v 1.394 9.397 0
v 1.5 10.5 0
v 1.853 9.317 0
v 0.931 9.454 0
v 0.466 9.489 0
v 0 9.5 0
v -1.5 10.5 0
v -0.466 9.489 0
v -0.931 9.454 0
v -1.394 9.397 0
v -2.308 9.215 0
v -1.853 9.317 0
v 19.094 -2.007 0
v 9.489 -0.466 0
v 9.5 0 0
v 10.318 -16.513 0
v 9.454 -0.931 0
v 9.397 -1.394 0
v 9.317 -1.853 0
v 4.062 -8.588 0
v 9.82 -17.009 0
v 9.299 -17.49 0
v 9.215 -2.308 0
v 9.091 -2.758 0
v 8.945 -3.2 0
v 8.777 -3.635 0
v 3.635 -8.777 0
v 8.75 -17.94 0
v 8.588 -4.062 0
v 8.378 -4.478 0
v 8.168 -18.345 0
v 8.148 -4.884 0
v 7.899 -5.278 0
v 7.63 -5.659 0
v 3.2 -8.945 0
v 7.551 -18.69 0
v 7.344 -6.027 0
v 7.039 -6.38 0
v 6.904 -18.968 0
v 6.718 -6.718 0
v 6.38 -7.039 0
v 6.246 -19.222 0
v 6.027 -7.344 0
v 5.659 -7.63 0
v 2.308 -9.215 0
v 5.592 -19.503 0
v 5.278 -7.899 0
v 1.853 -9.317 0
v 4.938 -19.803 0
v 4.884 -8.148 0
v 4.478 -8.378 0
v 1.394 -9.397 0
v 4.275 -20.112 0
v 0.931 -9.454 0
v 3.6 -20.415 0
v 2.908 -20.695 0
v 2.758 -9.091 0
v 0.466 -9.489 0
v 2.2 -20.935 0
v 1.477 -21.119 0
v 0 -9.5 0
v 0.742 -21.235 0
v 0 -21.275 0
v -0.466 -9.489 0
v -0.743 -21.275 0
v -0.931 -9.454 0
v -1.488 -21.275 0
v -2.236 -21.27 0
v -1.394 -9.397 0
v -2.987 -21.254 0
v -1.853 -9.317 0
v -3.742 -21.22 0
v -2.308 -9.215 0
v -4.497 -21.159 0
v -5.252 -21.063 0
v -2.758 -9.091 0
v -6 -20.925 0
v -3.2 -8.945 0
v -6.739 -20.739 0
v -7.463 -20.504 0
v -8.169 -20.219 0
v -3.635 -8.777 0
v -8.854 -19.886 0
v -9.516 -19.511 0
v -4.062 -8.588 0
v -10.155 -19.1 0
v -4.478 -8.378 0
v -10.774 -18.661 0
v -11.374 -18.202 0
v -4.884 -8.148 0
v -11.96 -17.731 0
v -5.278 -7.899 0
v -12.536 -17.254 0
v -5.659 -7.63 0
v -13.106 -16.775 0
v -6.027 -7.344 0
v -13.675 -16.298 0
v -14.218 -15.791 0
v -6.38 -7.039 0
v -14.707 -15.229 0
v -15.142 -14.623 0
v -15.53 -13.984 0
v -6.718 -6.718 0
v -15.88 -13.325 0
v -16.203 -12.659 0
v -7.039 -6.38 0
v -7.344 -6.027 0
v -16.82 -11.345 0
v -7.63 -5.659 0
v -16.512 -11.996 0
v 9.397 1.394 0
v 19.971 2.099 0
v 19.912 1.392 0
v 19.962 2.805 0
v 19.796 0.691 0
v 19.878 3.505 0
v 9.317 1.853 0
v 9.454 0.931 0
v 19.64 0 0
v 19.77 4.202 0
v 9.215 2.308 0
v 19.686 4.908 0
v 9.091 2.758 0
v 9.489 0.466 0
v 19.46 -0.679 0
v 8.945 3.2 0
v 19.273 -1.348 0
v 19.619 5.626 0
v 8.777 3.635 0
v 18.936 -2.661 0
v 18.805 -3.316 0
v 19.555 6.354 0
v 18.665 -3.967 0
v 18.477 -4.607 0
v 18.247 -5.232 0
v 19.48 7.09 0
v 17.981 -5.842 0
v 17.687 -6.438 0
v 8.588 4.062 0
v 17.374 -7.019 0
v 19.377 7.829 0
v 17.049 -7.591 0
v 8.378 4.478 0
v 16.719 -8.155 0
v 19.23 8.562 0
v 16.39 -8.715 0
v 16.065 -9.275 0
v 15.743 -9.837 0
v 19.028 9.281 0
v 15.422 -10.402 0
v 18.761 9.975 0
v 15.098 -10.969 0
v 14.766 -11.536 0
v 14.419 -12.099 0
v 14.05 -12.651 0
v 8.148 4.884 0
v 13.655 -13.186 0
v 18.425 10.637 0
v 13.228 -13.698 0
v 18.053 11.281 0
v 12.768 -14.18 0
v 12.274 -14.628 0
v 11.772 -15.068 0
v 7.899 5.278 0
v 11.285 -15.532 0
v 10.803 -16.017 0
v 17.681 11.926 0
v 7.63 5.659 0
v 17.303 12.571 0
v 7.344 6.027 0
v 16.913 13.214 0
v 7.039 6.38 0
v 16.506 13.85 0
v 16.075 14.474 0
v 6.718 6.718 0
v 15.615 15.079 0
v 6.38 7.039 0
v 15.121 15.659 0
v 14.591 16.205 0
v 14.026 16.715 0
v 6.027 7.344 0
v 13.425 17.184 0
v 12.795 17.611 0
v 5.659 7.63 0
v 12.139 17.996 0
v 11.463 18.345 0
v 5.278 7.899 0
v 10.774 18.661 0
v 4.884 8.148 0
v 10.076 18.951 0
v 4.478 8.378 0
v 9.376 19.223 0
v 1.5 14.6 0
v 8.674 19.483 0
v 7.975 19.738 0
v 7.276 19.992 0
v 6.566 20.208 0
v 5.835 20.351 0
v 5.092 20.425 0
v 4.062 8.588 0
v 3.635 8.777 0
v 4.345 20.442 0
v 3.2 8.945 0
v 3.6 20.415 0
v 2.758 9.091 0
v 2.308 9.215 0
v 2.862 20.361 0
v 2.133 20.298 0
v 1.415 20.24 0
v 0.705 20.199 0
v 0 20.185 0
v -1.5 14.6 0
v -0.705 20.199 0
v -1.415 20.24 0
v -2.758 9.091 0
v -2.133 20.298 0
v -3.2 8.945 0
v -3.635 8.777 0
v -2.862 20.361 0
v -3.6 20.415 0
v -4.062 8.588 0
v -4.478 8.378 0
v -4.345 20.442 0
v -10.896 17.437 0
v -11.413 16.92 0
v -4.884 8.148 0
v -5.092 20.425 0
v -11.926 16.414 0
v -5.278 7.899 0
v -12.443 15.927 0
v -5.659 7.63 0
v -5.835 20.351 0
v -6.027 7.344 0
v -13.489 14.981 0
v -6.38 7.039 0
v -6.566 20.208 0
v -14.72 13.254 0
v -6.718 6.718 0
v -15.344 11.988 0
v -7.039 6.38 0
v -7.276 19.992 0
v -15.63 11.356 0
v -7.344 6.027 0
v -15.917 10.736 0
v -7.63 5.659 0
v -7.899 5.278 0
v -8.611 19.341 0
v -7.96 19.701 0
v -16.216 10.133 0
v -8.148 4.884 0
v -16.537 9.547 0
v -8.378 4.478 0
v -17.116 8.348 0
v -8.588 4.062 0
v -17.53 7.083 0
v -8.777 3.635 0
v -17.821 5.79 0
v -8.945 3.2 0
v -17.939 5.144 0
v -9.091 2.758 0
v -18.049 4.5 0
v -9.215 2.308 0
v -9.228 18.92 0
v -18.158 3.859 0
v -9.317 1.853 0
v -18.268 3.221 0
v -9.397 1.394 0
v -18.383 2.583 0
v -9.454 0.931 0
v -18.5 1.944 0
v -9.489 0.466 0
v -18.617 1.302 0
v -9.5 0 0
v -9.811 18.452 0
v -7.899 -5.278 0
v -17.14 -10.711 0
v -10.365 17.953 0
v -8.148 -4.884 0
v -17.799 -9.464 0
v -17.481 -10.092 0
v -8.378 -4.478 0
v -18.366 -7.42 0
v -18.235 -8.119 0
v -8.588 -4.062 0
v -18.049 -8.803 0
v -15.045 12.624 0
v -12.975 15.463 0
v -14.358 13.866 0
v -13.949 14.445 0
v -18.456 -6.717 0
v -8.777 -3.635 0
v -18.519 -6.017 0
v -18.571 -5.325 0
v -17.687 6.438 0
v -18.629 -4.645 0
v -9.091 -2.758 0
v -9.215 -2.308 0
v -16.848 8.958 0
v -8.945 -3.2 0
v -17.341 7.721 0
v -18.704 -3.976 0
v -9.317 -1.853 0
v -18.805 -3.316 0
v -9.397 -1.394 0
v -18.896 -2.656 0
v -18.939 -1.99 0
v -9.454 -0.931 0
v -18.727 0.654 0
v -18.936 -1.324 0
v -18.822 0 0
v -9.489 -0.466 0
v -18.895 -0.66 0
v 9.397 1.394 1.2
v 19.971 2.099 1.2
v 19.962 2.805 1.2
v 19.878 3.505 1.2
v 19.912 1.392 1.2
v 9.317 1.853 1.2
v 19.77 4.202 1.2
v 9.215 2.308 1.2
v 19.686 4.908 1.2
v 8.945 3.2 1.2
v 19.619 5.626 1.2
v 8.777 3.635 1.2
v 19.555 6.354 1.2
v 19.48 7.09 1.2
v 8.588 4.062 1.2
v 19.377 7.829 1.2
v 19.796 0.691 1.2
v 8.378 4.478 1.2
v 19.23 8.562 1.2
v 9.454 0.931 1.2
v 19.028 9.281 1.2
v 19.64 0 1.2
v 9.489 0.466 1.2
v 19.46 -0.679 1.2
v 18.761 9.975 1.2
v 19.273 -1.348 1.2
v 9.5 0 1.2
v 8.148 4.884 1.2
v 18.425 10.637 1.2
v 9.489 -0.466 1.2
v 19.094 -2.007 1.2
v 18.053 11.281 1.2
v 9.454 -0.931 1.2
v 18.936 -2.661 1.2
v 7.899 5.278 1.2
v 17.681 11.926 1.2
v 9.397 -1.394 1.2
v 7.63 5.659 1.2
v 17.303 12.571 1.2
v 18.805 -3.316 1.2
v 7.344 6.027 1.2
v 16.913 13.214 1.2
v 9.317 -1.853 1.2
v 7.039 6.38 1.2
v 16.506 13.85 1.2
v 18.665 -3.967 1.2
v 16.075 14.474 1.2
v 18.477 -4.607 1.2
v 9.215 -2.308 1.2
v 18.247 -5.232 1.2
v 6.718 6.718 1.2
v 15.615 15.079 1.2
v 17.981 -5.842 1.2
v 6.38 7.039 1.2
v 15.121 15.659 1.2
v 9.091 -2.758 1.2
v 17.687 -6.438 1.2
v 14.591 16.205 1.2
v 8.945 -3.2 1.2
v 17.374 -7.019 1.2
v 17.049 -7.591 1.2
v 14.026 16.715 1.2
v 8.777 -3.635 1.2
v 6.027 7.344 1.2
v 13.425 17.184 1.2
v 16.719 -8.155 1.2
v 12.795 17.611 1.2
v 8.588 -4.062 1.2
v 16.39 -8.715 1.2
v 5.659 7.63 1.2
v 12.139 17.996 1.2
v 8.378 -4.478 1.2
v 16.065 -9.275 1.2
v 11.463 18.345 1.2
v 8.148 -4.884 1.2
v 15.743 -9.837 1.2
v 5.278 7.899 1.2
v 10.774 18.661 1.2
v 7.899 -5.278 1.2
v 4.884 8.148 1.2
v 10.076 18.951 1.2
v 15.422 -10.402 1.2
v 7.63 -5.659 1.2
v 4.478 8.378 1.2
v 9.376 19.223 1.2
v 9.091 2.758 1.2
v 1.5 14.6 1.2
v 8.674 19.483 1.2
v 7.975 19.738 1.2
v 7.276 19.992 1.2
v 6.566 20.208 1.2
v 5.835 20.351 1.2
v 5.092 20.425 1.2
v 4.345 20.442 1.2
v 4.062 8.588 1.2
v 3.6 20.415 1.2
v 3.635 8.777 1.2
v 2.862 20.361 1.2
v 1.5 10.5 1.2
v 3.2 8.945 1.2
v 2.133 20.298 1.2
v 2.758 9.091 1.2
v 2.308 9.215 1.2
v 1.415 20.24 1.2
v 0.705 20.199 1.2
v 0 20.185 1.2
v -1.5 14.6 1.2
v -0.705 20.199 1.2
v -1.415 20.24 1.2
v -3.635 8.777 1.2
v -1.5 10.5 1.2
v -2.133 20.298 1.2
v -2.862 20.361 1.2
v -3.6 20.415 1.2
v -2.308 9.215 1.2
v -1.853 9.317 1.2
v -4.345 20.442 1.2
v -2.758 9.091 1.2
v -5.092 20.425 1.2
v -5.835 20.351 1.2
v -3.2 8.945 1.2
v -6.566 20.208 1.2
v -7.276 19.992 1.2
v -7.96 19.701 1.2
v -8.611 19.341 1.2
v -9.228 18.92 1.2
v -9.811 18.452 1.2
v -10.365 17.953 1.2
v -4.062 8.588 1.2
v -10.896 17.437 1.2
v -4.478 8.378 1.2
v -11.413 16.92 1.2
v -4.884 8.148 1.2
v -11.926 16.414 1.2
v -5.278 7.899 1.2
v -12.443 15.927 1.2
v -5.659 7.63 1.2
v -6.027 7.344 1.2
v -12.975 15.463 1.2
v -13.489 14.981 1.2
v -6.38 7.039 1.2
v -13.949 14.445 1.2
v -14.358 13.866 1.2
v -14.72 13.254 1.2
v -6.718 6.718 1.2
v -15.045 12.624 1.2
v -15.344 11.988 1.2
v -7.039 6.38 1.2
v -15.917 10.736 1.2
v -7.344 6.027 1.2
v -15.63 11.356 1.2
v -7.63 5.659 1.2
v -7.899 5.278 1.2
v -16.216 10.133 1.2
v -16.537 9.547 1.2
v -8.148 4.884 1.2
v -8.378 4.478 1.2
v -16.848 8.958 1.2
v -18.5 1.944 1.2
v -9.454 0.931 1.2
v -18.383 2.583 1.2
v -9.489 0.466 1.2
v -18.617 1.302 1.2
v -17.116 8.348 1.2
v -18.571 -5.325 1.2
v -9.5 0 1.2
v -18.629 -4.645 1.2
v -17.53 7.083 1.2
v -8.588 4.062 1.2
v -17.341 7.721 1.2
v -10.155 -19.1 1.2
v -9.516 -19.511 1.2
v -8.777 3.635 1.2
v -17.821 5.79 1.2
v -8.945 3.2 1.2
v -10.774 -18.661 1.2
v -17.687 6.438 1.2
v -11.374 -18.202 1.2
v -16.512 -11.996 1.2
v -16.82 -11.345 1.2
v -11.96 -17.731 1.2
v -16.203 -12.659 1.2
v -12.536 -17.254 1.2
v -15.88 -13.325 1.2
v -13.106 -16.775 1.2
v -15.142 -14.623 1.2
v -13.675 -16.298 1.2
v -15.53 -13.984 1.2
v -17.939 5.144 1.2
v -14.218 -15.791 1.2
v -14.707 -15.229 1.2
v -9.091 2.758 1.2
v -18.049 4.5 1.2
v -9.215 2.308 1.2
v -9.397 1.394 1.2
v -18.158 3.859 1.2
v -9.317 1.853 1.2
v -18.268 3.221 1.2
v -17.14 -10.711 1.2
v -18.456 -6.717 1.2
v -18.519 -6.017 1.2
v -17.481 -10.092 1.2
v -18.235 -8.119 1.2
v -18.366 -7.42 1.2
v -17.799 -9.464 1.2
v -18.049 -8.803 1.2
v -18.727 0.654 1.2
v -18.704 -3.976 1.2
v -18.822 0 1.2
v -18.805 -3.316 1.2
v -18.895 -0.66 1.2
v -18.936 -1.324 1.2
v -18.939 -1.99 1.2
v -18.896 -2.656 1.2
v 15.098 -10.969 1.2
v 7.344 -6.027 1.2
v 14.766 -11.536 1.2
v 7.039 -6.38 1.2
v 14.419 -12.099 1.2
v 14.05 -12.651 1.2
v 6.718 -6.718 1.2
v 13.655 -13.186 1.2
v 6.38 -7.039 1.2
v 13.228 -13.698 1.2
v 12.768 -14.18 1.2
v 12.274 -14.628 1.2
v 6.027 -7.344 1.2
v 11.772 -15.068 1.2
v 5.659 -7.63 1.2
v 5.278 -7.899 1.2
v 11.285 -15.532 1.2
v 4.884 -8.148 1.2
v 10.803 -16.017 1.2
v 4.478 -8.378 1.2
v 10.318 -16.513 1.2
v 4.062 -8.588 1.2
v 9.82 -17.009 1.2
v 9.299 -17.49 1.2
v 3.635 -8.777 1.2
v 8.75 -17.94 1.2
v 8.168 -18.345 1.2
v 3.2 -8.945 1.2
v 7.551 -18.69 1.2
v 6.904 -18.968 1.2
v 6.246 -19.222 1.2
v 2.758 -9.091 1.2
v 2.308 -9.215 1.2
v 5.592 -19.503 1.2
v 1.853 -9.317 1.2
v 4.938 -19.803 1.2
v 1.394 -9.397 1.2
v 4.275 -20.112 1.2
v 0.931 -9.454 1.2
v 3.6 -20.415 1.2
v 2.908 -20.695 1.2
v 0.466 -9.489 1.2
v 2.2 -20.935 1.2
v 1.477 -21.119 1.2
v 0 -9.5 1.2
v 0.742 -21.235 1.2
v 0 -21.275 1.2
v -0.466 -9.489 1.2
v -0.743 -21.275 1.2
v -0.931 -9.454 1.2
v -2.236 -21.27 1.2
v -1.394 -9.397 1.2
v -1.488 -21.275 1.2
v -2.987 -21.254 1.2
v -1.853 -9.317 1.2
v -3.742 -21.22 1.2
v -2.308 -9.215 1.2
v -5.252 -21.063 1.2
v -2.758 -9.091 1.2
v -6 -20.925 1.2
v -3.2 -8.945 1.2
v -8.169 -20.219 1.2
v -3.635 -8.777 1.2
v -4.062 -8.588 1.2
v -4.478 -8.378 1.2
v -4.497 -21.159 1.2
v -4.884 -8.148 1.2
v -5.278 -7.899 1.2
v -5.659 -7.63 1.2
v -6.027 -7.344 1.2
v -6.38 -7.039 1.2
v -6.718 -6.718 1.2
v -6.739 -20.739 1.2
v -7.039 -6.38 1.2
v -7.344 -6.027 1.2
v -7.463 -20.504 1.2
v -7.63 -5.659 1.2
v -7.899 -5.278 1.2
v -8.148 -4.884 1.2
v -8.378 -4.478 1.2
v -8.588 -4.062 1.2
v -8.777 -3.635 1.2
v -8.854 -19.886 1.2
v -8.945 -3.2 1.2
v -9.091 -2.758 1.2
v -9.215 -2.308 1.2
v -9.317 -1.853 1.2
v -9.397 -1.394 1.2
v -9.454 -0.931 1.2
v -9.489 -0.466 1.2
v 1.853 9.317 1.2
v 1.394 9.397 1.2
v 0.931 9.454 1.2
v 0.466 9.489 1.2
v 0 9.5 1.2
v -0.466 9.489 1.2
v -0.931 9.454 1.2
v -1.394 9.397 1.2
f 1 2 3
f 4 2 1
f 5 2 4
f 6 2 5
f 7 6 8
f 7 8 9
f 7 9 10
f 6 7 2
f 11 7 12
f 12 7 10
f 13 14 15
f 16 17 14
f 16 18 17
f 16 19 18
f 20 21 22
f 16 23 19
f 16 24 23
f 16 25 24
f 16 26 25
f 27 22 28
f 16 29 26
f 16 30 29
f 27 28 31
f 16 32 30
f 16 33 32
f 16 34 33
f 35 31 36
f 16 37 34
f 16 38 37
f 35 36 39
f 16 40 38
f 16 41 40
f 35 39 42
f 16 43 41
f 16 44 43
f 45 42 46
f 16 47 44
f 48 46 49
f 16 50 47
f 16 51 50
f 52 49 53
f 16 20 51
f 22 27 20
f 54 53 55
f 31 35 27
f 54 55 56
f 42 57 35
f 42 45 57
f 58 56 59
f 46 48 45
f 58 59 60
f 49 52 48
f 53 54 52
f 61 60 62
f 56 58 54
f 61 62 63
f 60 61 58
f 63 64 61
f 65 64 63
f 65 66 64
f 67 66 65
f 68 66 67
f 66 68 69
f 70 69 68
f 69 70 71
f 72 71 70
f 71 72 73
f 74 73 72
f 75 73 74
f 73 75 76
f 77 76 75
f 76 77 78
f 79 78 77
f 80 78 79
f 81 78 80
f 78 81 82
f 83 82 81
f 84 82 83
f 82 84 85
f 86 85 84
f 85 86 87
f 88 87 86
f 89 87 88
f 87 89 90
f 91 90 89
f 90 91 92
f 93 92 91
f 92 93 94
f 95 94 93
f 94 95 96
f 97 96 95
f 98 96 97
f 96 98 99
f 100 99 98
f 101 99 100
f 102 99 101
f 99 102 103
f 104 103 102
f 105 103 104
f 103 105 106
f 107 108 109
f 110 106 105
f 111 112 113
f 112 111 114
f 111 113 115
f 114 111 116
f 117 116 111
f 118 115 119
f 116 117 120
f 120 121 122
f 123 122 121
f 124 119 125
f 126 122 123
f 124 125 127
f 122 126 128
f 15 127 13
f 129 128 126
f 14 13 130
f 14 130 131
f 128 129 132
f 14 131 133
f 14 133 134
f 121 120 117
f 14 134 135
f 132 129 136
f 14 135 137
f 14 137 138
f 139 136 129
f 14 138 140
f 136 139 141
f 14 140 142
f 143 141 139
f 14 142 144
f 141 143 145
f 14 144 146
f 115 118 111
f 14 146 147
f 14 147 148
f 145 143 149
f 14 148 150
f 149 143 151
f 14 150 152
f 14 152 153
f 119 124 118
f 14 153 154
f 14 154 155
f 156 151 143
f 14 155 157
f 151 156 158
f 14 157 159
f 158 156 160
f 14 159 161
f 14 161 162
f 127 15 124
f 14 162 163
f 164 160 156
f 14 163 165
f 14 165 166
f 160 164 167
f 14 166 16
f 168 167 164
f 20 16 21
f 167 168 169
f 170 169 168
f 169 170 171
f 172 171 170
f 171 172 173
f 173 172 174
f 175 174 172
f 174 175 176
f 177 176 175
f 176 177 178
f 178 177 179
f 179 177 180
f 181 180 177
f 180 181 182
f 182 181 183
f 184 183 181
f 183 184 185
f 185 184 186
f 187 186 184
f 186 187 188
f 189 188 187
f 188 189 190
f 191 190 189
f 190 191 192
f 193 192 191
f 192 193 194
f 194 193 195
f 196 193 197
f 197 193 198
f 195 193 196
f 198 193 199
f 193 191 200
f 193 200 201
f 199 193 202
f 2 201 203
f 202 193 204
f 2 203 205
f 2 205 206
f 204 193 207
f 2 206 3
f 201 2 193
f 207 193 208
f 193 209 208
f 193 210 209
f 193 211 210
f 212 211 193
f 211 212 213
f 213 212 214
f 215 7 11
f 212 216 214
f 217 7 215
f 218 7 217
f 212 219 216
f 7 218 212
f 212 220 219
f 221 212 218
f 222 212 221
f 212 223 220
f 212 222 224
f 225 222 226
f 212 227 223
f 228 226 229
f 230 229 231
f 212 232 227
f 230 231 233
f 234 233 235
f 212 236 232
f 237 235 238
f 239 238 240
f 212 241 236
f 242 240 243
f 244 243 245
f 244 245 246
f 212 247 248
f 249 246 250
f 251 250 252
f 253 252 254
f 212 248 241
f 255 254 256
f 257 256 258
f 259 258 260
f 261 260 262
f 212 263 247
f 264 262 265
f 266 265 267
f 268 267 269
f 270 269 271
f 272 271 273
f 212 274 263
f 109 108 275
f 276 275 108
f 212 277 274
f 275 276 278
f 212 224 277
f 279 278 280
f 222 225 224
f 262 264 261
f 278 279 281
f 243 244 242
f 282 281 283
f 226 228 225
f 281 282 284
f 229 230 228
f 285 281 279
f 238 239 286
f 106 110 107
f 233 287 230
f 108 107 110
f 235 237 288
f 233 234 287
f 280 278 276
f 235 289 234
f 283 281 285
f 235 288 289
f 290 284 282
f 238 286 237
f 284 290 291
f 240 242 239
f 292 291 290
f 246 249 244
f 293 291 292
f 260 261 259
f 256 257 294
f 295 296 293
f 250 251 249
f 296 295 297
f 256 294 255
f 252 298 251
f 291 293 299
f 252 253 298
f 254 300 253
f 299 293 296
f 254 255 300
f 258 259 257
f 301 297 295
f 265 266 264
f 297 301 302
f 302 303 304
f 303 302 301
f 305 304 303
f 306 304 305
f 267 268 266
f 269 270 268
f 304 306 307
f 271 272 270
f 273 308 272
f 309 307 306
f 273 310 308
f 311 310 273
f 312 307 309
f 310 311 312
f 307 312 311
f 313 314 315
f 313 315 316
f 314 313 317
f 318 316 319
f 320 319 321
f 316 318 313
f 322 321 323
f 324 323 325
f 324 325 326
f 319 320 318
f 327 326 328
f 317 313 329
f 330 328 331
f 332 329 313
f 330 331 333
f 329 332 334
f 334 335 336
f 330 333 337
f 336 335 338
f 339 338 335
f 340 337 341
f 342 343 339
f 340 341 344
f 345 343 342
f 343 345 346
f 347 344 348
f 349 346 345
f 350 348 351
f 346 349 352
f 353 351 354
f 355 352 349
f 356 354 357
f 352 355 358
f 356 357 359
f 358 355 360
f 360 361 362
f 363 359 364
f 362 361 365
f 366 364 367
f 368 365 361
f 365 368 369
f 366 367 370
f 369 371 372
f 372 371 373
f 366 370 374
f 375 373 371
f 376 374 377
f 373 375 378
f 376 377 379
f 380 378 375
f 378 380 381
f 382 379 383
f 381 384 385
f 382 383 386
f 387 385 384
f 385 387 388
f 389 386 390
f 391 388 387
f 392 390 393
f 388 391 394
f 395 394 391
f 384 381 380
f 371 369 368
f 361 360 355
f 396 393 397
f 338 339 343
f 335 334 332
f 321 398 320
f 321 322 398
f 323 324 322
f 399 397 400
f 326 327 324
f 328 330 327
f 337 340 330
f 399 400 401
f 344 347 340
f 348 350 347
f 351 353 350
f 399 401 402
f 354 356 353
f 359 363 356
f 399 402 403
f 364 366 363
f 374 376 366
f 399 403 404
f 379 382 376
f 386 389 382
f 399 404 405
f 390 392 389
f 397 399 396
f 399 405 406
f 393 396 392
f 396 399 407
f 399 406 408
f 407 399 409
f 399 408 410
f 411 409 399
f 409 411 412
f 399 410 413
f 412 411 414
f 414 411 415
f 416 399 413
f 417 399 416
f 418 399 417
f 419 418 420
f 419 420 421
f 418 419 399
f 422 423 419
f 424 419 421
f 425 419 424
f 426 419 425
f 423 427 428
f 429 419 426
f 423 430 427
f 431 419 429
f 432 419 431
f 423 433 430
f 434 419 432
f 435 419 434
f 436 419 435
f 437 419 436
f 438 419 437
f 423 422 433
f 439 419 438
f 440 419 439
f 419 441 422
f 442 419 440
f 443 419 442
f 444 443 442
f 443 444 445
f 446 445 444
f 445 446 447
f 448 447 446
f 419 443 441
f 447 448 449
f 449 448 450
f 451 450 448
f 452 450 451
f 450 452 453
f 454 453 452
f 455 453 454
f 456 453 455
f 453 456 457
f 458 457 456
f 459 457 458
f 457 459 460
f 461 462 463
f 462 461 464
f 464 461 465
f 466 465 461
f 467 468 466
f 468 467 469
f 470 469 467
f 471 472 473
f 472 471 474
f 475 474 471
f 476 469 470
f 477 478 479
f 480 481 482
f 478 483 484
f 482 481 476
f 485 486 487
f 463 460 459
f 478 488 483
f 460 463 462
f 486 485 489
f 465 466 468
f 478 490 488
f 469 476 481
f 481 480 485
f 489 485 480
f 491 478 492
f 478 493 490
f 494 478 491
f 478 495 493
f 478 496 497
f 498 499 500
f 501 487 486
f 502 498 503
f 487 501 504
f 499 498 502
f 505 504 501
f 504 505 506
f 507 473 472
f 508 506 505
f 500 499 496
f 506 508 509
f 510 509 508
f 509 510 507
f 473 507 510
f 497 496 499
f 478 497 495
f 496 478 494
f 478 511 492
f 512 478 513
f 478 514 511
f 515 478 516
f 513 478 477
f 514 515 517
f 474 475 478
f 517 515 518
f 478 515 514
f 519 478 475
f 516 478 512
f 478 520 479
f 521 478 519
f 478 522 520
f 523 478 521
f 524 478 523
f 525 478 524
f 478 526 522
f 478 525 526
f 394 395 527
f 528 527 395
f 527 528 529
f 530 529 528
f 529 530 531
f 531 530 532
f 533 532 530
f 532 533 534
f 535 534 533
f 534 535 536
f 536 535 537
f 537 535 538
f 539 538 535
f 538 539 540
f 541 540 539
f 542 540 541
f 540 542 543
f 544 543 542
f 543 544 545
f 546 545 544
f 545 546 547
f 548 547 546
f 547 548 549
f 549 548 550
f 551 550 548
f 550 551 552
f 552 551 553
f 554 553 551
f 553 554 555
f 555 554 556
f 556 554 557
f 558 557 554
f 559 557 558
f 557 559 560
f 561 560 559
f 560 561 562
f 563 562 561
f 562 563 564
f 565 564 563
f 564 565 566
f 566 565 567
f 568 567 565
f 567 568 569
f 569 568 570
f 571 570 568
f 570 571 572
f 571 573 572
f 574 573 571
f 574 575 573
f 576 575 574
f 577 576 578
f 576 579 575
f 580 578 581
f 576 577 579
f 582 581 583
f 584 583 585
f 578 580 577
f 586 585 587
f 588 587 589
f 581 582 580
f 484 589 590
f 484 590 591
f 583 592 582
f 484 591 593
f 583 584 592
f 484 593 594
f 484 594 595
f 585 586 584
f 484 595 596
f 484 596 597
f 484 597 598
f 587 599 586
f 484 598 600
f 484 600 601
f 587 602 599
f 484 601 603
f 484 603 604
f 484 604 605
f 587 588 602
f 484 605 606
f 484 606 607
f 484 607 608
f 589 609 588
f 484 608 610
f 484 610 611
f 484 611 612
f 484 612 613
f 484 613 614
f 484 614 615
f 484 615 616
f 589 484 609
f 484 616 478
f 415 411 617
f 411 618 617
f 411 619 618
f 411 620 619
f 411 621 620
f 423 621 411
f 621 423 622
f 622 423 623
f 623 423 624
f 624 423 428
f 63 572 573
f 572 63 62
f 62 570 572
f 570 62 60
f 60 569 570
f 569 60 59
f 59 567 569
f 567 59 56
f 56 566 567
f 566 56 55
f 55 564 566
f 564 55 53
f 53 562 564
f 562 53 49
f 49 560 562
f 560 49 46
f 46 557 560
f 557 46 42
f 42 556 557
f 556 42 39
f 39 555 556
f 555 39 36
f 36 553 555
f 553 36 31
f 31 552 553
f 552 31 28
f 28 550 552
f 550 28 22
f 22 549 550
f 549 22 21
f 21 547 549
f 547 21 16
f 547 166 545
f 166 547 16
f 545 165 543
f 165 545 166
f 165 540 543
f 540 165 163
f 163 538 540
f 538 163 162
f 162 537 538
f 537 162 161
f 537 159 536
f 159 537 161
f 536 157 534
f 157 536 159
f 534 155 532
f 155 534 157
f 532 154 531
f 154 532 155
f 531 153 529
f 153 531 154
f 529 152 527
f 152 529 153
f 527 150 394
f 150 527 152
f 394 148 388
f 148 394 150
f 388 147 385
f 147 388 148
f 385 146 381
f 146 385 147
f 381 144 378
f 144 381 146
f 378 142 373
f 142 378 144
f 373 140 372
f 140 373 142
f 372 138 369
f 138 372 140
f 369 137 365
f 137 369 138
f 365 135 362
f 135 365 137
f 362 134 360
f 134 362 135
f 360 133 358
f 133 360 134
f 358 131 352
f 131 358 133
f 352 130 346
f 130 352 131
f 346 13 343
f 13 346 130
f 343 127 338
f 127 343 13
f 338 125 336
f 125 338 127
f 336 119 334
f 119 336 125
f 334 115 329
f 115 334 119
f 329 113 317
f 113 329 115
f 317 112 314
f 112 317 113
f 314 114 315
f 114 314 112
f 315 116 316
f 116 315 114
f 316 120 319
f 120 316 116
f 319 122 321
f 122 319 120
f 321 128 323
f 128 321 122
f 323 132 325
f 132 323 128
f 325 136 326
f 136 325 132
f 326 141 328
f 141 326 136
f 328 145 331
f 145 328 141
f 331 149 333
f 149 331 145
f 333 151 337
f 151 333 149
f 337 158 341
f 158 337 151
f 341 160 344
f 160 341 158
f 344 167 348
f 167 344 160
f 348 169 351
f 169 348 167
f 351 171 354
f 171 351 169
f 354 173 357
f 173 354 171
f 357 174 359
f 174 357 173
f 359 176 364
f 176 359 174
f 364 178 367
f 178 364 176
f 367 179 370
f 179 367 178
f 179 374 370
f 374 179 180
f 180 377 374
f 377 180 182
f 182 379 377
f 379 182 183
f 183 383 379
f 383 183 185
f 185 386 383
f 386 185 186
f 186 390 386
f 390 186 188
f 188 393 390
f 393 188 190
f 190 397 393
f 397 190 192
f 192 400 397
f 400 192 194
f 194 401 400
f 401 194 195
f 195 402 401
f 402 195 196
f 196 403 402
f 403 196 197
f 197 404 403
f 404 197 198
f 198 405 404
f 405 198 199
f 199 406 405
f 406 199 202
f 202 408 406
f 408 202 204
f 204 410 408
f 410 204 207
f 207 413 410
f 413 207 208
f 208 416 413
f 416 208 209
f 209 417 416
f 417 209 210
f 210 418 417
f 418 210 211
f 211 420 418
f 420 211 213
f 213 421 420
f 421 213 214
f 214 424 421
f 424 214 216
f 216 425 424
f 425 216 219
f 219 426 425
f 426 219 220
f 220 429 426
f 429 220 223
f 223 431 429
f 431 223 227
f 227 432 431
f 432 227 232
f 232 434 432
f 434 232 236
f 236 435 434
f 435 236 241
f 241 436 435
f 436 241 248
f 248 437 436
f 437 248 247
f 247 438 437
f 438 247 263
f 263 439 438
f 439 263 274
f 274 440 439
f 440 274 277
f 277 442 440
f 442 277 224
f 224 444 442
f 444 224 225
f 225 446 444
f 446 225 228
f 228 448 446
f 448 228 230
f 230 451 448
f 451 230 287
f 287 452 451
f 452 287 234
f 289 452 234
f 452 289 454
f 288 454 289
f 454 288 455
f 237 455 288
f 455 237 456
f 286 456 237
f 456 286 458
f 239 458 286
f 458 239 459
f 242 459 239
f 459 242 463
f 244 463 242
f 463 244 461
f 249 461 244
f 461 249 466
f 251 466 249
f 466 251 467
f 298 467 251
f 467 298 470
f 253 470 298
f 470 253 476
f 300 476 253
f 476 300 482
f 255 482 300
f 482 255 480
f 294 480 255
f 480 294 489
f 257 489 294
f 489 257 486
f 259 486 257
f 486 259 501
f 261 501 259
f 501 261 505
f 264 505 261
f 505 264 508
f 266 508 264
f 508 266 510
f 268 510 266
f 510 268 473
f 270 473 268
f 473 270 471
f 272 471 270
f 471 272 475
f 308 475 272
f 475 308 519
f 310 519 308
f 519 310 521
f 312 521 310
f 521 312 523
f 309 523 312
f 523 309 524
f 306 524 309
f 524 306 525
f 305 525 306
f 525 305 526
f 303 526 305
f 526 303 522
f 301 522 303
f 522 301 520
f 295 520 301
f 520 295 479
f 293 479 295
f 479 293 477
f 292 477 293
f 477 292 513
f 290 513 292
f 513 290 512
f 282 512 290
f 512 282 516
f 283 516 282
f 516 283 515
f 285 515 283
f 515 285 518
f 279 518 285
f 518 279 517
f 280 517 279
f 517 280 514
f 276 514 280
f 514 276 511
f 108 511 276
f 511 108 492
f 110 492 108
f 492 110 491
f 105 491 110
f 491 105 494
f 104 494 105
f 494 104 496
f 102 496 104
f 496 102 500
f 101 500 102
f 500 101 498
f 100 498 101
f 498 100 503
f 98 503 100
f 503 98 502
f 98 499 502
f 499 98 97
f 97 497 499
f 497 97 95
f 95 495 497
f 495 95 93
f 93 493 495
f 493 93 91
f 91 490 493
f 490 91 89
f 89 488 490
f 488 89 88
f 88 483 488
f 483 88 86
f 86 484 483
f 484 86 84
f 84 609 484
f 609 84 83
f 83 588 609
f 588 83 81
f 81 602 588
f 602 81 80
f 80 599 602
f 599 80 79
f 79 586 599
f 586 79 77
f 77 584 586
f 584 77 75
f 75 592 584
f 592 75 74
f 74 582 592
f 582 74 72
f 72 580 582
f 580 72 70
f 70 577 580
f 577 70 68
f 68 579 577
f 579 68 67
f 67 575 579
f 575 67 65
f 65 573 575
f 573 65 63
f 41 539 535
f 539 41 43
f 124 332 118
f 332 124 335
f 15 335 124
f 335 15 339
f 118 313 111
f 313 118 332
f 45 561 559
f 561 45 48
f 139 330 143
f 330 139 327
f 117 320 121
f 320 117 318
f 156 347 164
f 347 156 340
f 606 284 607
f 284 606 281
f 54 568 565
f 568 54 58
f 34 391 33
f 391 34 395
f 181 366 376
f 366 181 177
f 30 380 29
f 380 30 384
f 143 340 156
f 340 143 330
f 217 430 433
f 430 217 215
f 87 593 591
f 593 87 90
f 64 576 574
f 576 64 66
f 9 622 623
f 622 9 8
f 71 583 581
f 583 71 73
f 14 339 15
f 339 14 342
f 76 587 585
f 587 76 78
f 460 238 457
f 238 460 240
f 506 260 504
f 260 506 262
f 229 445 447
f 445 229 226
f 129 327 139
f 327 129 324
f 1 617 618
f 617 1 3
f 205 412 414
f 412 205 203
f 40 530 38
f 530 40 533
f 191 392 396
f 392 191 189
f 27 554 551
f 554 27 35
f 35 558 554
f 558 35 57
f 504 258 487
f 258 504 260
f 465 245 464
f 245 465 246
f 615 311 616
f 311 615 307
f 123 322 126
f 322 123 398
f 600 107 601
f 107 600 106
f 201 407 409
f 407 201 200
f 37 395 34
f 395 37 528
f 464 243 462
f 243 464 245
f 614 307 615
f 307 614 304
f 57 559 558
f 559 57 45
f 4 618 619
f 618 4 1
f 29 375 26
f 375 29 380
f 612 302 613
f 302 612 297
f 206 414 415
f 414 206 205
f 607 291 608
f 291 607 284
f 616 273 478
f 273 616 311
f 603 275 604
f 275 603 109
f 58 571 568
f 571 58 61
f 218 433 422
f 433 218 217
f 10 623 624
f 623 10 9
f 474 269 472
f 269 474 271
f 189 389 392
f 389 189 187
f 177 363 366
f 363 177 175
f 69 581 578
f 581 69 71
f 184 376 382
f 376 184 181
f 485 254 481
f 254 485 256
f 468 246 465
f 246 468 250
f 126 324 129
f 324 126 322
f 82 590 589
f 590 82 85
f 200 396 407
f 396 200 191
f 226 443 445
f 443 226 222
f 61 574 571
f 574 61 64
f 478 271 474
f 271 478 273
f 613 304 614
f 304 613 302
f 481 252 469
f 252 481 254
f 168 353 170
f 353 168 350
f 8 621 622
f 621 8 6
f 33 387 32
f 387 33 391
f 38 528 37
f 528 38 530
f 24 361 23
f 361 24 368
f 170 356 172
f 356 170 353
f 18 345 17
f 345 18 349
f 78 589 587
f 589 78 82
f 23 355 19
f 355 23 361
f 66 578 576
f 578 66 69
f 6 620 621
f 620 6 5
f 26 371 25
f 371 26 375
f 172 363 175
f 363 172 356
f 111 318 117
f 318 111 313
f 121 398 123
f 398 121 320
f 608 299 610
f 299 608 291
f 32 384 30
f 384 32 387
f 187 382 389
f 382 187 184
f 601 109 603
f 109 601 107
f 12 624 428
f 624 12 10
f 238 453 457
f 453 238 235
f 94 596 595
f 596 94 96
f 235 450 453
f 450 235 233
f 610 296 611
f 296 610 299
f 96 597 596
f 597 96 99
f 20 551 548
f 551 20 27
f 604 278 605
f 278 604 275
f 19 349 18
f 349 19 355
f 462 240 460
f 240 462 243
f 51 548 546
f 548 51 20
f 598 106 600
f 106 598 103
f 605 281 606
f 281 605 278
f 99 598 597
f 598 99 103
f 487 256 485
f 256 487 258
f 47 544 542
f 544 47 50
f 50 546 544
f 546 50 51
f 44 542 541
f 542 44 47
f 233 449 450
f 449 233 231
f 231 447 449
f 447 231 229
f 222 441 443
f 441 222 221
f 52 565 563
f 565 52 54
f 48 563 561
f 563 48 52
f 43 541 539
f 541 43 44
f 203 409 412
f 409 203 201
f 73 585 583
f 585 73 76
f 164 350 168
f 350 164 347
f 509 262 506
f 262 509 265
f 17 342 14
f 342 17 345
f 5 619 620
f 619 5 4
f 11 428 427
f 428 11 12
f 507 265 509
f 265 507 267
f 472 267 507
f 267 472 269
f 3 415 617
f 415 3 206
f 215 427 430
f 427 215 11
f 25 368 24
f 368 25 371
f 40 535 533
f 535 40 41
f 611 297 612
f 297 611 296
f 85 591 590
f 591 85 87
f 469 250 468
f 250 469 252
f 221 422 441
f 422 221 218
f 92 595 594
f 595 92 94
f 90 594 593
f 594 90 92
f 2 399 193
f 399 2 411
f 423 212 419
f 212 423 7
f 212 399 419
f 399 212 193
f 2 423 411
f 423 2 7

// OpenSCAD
/*
  Elna Supermatic cam 25
  Name: Large sine wave
  Status: candidate

  Generated from measured parametric base v2.
  Surface mode: smooth
*/

include <_elna_measured_common.scad>;

profile_points = [
        [0.0000, 20.1850],
        [0.7054, 20.1994],
        [1.4153, 20.2397],
        [2.1334, 20.2979],
        [2.8616, 20.3615],
        [3.5997, 20.4151],
        [4.3450, 20.4417],
        [5.0925, 20.4251],
        [5.8355, 20.3508],
        [6.5661, 20.2084],
        [7.2765, 19.9920],
        [7.9748, 19.7382],
        [8.6745, 19.4832],
        [9.3756, 19.2228],
        [10.0764, 18.9510],
        [10.7737, 18.6607],
        [11.4631, 18.3447],
        [12.1388, 17.9965],
        [12.7949, 17.6106],
        [13.4255, 17.1839],
        [14.0256, 16.7151],
        [14.5915, 16.2055],
        [15.1213, 15.6586],
        [15.6152, 15.0794],
        [16.0755, 14.4744],
        [16.5063, 13.8505],
        [16.9133, 13.2141],
        [17.3027, 12.5712],
        [17.6809, 11.9259],
        [18.0535, 11.2811],
        [18.4247, 10.6375],
        [18.7612, 9.9755],
        [19.0283, 9.2807],
        [19.2304, 8.5619],
        [19.3767, 7.8287],
        [19.4798, 7.0901],
        [19.5552, 6.3539],
        [19.6190, 5.6257],
        [19.6864, 4.9084],
        [19.7700, 4.2022],
        [19.8783, 3.5051],
        [19.9621, 2.8055],
        [19.9709, 2.0990],
        [19.9117, 1.3924],
        [19.7963, 0.6913],
        [19.6400, 0.0000],
        [19.4597, -0.6795],
        [19.2726, -1.3477],
        [19.0939, -2.0069],
        [18.9356, -2.6612],
        [18.8049, -3.3158],
        [18.6647, -3.9673],
        [18.4773, -4.6069],
        [18.2473, -5.2323],
        [17.9813, -5.8425],
        [17.6874, -6.4377],
        [17.3738, -7.0195],
        [17.0489, -7.5907],
        [16.7194, -8.1546],
        [16.3905, -8.7150],
        [16.0648, -9.2750],
        [15.7426, -9.8371],
        [15.4218, -10.4021],
        [15.0981, -10.9694],
        [14.7660, -11.5364],
        [14.4189, -12.0989],
        [14.0504, -12.6511],
        [13.6550, -13.1865],
        [13.2283, -13.6984],
        [12.7681, -14.1804],
        [12.2740, -14.6276],
        [11.7725, -15.0681],
        [11.2849, -15.5324],
        [10.8034, -16.0167],
        [10.3184, -16.5128],
        [9.8200, -17.0087],
        [9.2995, -17.4898],
        [8.7500, -17.9402],
        [8.1676, -18.3448],
        [7.5514, -18.6905],
        [6.9037, -18.9677],
        [6.2458, -19.2224],
        [5.5924, -19.5031],
        [4.9375, -19.8034],
        [4.2750, -20.1123],
        [3.5997, -20.4151],
        [2.9085, -20.6950],
        [2.2004, -20.9350],
        [1.4768, -21.1193],
        [0.7416, -21.2354],
        [0.0000, -21.2750],
        [-0.7430, -21.2754],
        [-1.4877, -21.2751],
        [-2.2356, -21.2702],
        [-2.9871, -21.2544],
        [-3.7417, -21.2201],
        [-4.4975, -21.1590],
        [-5.2516, -21.0629],
        [-6.0001, -20.9247],
        [-6.7386, -20.7394],
        [-7.4629, -20.5041],
        [-8.1689, -20.2188],
        [-8.8538, -19.8860],
        [-9.5160, -19.5107],
        [-10.1555, -19.0997],
        [-10.7738, -18.6607],
        [-11.3738, -18.2019],
        [-11.9596, -17.7309],
        [-12.5357, -17.2539],
        [-13.1064, -16.7754],
        [-13.6753, -16.2976],
        [-14.2179, -15.7906],
        [-14.7066, -15.2291],
        [-15.1423, -14.6228],
        [-15.5305, -13.9838],
        [-15.8801, -13.3250],
        [-16.2028, -12.6590],
        [-16.5118, -11.9965],
        [-16.8204, -11.3455],
        [-17.1405, -10.7106],
        [-17.4807, -10.0925],
        [-17.7987, -9.4638],
        [-18.0486, -8.8029],
        [-18.2347, -8.1186],
        [-18.3660, -7.4204],
        [-18.4556, -6.7173],
        [-18.5186, -6.0171],
        [-18.5712, -5.3252],
        [-18.6288, -4.6447],
        [-18.7038, -3.9756],
        [-18.8049, -3.3158],
        [-18.8960, -2.6557],
        [-18.9386, -1.9905],
        [-18.9364, -1.3242],
        [-18.8952, -0.6598],
        [-18.8225, -0.0000],
        [-18.7269, 0.6540],
        [-18.6169, 1.3018],
        [-18.5001, 1.9444],
        [-18.3827, 2.5835],
        [-18.2682, 3.2212],
        [-18.1577, 3.8595],
        [-18.0495, 4.5002],
        [-17.9394, 5.1440],
        [-17.8212, 5.7905],
        [-17.6874, 6.4377],
        [-17.5300, 7.0826],
        [-17.3415, 7.7209],
        [-17.1157, 8.3479],
        [-16.8481, 8.9583],
        [-16.5368, 9.5475],
        [-16.2161, 10.1329],
        [-15.9168, 10.7360],
        [-15.6299, 11.3558],
        [-15.3438, 11.9879],
        [-15.0451, 12.6243],
        [-14.7205, 13.2544],
        [-14.3583, 13.8656],
        [-13.9494, 14.4450],
        [-13.4886, 14.9806],
        [-12.9747, 15.4626],
        [-12.4435, 15.9270],
        [-11.9256, 16.4142],
        [-11.4129, 16.9204],
        [-10.8960, 17.4372],
        [-10.3650, 17.9527],
        [-9.8112, 18.4522],
        [-9.2279, 18.9199],
        [-8.6110, 19.3406],
        [-7.9598, 19.7011],
        [-7.2765, 19.9920],
        [-6.5661, 20.2084],
        [-5.8355, 20.3508],
        [-5.0925, 20.4251],
        [-4.3450, 20.4417],
        [-3.5997, 20.4151],
        [-2.8616, 20.3615],
        [-2.1334, 20.2979],
        [-1.4153, 20.2397],
        [-0.7054, 20.1994]
];

icon_points = [[-1.000,0.500], [-0.956,0.599], [-0.911,0.691], [-0.867,0.768], [-0.822,0.824], [-0.778,0.855], [-0.733,0.858], [-0.689,0.834], [-0.644,0.784], [-0.600,0.712], [-0.556,0.623], [-0.511,0.525], [-0.467,0.425], [-0.422,0.331], [-0.378,0.250], [-0.333,0.188], [-0.289,0.151], [-0.244,0.140], [-0.200,0.158], [-0.156,0.202], [-0.111,0.269], [-0.067,0.354], [-0.022,0.450], [0.022,0.550], [0.067,0.646], [0.111,0.731], [0.156,0.798], [0.200,0.842], [0.244,0.860], [0.289,0.849], [0.333,0.812], [0.378,0.750], [0.422,0.669], [0.467,0.575], [0.511,0.475], [0.556,0.377], [0.600,0.288], [0.644,0.216], [0.689,0.166], [0.733,0.142], [0.778,0.145], [0.822,0.176], [0.867,0.232], [0.911,0.309], [0.956,0.401], [1.000,0.500]];

elna_cam_ring(profile_points=profile_points);
